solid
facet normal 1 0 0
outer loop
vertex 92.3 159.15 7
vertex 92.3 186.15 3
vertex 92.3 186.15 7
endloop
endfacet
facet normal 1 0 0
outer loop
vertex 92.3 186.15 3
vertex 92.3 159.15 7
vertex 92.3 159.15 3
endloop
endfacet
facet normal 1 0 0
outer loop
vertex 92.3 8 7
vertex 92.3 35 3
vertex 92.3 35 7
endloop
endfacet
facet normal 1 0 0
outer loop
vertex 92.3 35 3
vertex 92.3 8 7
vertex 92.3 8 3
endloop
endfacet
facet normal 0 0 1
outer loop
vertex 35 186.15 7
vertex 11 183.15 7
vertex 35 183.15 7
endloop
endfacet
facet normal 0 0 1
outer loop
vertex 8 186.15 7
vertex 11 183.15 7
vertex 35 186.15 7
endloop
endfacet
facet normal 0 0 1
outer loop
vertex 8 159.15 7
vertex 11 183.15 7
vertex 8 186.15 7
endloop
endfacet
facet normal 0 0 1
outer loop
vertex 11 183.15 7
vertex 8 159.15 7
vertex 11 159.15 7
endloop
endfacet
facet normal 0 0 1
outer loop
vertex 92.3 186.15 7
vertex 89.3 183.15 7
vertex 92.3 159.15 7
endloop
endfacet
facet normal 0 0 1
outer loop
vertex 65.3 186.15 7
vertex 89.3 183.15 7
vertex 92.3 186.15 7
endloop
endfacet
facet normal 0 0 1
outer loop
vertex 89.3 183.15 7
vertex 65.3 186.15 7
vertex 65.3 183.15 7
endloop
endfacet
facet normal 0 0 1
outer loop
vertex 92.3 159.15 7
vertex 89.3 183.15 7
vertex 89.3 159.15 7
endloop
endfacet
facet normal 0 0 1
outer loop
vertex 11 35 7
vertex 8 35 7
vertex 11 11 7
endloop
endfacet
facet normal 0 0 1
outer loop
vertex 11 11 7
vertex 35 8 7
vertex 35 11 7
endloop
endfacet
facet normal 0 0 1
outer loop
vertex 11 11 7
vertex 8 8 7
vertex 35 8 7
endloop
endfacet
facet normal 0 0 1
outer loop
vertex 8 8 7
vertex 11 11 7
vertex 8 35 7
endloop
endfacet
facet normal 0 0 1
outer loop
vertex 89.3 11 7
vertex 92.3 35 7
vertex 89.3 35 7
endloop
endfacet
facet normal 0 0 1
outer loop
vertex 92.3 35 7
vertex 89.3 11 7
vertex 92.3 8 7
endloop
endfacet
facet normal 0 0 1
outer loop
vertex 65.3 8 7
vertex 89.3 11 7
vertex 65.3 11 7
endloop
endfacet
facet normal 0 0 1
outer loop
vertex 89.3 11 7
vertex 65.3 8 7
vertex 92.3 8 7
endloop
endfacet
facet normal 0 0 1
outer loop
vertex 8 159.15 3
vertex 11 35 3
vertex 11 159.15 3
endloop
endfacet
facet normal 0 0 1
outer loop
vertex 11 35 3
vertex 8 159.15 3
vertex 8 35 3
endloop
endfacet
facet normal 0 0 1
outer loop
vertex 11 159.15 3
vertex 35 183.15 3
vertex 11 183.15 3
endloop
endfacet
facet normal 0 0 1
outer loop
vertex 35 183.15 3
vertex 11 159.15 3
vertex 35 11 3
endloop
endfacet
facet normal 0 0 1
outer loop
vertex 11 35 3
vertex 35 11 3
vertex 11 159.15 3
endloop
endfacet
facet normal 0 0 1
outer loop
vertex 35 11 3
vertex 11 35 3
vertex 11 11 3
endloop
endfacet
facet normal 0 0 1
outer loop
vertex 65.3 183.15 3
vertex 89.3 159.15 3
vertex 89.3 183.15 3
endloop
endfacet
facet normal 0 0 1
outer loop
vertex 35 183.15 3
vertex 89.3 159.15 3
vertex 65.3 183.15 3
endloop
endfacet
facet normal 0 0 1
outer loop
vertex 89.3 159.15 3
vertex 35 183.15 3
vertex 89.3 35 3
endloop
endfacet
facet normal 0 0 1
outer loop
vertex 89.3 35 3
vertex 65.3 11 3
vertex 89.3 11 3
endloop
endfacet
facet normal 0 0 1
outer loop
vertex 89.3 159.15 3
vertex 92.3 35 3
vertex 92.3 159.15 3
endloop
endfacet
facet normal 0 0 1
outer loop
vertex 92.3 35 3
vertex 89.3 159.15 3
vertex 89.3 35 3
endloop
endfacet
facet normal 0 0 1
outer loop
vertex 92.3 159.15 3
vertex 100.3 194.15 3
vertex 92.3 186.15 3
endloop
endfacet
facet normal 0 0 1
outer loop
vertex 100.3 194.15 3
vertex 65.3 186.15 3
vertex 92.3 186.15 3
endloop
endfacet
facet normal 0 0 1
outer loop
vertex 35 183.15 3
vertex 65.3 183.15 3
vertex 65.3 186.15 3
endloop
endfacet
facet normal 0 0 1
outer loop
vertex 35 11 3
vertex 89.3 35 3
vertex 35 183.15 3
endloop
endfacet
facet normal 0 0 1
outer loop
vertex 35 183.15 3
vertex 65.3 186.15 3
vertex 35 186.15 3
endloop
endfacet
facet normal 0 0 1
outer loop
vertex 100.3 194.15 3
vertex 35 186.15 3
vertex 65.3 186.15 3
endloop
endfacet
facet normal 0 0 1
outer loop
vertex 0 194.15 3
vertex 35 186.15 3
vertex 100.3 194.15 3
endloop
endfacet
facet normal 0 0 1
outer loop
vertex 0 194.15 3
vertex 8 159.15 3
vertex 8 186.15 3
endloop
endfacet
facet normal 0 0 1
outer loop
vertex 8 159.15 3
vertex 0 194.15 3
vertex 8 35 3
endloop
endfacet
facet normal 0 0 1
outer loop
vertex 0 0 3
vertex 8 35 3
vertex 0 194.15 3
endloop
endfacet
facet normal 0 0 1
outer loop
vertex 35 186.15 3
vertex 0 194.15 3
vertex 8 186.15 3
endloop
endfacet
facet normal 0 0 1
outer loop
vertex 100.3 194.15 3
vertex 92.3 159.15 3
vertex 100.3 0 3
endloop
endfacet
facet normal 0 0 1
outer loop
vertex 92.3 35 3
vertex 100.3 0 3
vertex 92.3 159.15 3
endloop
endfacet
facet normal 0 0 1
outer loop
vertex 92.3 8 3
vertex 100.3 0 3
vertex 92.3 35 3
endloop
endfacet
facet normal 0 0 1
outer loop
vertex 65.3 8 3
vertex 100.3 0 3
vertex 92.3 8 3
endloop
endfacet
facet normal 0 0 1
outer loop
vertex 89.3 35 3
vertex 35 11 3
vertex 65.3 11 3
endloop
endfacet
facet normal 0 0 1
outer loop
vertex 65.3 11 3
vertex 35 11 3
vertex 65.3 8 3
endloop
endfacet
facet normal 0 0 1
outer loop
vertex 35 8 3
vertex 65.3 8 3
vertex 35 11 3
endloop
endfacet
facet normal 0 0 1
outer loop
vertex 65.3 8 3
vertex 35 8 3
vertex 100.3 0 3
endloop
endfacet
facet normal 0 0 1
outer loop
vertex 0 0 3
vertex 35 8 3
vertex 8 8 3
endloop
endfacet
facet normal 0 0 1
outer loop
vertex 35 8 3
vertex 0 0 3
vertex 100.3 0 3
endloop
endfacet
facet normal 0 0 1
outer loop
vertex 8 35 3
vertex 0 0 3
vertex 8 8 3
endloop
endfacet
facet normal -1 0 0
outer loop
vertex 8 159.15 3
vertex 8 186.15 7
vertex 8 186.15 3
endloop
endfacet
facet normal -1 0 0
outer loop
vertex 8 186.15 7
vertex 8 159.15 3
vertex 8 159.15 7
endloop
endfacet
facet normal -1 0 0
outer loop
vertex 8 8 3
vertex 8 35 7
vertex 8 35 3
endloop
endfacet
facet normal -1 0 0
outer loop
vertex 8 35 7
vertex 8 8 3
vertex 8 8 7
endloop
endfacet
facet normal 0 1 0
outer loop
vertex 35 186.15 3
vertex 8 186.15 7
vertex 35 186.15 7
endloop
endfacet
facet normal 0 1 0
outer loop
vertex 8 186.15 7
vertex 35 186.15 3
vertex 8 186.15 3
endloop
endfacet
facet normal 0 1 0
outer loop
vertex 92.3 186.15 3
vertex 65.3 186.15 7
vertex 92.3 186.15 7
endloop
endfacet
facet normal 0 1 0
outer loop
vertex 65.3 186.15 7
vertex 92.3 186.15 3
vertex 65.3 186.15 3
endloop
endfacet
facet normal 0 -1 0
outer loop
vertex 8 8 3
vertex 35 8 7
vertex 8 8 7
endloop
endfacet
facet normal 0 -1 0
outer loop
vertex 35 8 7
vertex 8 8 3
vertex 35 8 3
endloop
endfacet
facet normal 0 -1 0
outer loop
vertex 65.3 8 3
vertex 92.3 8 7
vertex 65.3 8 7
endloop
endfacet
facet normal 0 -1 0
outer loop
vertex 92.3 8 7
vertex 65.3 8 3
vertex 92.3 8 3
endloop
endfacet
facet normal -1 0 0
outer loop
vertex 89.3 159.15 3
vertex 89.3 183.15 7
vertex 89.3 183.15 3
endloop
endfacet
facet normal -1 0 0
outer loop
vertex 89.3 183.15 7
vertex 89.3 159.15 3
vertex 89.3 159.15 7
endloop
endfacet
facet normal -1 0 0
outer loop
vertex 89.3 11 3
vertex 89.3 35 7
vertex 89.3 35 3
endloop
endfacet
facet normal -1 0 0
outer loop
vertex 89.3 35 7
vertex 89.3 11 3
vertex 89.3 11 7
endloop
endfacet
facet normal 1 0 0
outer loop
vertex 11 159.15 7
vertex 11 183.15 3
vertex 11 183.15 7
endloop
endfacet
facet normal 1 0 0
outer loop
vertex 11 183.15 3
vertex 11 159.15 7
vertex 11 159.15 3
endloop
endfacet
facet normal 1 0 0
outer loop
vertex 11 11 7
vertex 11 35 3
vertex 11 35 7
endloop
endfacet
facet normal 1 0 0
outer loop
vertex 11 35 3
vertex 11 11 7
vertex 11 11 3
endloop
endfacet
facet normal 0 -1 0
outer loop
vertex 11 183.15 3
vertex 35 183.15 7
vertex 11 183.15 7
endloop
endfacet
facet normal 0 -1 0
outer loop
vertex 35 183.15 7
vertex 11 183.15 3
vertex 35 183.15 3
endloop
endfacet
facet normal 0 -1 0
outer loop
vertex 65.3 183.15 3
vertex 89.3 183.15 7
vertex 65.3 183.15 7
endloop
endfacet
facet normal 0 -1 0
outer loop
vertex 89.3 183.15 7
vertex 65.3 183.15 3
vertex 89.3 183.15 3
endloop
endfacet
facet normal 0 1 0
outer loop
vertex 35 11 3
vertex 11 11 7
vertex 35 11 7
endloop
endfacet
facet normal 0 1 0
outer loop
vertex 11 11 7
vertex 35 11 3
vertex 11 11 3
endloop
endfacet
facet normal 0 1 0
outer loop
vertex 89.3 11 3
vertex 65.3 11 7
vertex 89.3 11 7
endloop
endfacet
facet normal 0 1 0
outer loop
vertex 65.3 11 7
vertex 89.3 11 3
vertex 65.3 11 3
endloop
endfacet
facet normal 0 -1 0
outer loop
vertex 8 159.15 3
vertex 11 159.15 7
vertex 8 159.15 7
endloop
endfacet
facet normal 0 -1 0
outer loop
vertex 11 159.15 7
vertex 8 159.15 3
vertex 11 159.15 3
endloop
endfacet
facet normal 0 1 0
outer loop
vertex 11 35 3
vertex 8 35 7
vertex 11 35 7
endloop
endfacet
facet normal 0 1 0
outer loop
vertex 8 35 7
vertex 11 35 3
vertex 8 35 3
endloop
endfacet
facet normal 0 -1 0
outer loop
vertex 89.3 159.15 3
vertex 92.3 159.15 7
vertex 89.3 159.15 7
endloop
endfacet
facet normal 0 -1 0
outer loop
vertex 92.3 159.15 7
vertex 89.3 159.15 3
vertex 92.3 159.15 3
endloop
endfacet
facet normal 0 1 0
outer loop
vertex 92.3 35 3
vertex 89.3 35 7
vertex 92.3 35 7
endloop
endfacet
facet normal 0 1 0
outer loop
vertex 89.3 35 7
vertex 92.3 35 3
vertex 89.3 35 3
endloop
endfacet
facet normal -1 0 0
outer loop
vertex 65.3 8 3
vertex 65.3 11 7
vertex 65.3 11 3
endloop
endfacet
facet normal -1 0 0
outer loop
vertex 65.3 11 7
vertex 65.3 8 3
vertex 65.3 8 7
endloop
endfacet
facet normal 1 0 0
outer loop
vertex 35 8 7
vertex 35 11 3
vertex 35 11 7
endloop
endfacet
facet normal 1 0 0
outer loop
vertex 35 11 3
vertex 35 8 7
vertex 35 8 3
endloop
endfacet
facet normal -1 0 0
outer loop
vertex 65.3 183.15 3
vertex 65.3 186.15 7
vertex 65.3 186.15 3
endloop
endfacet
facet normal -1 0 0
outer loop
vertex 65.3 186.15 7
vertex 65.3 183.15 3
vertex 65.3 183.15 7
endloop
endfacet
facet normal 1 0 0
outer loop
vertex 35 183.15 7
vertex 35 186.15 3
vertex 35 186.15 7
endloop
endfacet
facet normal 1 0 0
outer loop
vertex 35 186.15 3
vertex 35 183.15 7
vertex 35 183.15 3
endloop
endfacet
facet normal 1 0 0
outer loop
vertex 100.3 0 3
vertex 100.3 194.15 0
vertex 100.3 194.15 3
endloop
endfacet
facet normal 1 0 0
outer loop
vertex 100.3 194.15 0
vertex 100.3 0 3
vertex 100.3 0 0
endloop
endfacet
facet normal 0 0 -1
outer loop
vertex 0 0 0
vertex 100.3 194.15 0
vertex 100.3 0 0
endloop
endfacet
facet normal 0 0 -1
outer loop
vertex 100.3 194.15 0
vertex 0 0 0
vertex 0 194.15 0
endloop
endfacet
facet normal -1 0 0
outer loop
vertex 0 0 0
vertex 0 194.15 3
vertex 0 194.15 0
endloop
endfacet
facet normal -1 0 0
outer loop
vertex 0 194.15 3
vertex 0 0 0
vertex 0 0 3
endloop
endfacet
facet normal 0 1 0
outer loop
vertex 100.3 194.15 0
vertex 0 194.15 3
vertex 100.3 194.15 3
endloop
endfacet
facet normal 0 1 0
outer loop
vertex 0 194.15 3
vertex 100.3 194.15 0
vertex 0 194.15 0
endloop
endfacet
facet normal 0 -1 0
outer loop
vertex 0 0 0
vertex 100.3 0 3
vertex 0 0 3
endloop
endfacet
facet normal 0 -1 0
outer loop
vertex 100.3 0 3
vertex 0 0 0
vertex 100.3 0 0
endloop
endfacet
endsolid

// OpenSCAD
// Gabarito (jig) para Moto G06 na mesa da P1S.
// ATENÇÃO: não foi renderizado/testado fisicamente. Imprima primeiro uma versão
// rápida (baixo infill) e confira o encaixe com o celular real antes de usar.
//
// Só os cantos seguram o celular: os lados ficam livres para os botões
// (liga/volume na lateral direita) e o cabo USB-C (parte inferior).

phone_w = 77.5;    // largura
phone_h = 171.35;  // altura
phone_t = 8.31;    // espessura
tol     = 0.4;     // folga por lado (ajuste conforme a sua impressora)

base_t   = 3;      // espessura da base
wall_h   = 4;      // altura dos cantos (menor que a espessura do celular)
wall_th  = 3;      // espessura da parede
corner_l = 24;     // comprimento do braço de cada canto
margin   = 8;      // sobra da base além das paredes

pocket_w = phone_w + 2*tol;
pocket_h = phone_h + 2*tol;
plate_w  = pocket_w + 2*(wall_th + margin);
plate_h  = pocket_h + 2*(wall_th + margin);
ox = (plate_w - pocket_w)/2;   // origem do "bolso" na base
oy = (plate_h - pocket_h)/2;

echo(str("Superfície da tela fica a ", base_t + phone_t, " mm acima da mesa"));

// base
cube([plate_w, plate_h, base_t]);

// cantos
translate([0, 0, base_t])
difference() {
    translate([ox - wall_th, oy - wall_th, 0])
        cube([pocket_w + 2*wall_th, pocket_h + 2*wall_th, wall_h]);
    // bolso do celular
    translate([ox, oy, -1]) cube([pocket_w, pocket_h, wall_h + 2]);
    // recortes no meio de cada lado (deixam só os cantos)
    translate([ox - wall_th - 1, oy + corner_l, -1])
        cube([wall_th + 1.5, pocket_h - 2*corner_l, wall_h + 2]);                 // esquerda
    translate([ox + pocket_w - 0.5, oy + corner_l, -1])
        cube([wall_th + 1.5, pocket_h - 2*corner_l, wall_h + 2]);                 // direita
    translate([ox + corner_l, oy - wall_th - 1, -1])
        cube([pocket_w - 2*corner_l, wall_th + 1.5, wall_h + 2]);                 // embaixo
    translate([ox + corner_l, oy + pocket_h - 0.5, -1])
        cube([pocket_w - 2*corner_l, wall_th + 1.5, wall_h + 2]);                 // em cima
}
